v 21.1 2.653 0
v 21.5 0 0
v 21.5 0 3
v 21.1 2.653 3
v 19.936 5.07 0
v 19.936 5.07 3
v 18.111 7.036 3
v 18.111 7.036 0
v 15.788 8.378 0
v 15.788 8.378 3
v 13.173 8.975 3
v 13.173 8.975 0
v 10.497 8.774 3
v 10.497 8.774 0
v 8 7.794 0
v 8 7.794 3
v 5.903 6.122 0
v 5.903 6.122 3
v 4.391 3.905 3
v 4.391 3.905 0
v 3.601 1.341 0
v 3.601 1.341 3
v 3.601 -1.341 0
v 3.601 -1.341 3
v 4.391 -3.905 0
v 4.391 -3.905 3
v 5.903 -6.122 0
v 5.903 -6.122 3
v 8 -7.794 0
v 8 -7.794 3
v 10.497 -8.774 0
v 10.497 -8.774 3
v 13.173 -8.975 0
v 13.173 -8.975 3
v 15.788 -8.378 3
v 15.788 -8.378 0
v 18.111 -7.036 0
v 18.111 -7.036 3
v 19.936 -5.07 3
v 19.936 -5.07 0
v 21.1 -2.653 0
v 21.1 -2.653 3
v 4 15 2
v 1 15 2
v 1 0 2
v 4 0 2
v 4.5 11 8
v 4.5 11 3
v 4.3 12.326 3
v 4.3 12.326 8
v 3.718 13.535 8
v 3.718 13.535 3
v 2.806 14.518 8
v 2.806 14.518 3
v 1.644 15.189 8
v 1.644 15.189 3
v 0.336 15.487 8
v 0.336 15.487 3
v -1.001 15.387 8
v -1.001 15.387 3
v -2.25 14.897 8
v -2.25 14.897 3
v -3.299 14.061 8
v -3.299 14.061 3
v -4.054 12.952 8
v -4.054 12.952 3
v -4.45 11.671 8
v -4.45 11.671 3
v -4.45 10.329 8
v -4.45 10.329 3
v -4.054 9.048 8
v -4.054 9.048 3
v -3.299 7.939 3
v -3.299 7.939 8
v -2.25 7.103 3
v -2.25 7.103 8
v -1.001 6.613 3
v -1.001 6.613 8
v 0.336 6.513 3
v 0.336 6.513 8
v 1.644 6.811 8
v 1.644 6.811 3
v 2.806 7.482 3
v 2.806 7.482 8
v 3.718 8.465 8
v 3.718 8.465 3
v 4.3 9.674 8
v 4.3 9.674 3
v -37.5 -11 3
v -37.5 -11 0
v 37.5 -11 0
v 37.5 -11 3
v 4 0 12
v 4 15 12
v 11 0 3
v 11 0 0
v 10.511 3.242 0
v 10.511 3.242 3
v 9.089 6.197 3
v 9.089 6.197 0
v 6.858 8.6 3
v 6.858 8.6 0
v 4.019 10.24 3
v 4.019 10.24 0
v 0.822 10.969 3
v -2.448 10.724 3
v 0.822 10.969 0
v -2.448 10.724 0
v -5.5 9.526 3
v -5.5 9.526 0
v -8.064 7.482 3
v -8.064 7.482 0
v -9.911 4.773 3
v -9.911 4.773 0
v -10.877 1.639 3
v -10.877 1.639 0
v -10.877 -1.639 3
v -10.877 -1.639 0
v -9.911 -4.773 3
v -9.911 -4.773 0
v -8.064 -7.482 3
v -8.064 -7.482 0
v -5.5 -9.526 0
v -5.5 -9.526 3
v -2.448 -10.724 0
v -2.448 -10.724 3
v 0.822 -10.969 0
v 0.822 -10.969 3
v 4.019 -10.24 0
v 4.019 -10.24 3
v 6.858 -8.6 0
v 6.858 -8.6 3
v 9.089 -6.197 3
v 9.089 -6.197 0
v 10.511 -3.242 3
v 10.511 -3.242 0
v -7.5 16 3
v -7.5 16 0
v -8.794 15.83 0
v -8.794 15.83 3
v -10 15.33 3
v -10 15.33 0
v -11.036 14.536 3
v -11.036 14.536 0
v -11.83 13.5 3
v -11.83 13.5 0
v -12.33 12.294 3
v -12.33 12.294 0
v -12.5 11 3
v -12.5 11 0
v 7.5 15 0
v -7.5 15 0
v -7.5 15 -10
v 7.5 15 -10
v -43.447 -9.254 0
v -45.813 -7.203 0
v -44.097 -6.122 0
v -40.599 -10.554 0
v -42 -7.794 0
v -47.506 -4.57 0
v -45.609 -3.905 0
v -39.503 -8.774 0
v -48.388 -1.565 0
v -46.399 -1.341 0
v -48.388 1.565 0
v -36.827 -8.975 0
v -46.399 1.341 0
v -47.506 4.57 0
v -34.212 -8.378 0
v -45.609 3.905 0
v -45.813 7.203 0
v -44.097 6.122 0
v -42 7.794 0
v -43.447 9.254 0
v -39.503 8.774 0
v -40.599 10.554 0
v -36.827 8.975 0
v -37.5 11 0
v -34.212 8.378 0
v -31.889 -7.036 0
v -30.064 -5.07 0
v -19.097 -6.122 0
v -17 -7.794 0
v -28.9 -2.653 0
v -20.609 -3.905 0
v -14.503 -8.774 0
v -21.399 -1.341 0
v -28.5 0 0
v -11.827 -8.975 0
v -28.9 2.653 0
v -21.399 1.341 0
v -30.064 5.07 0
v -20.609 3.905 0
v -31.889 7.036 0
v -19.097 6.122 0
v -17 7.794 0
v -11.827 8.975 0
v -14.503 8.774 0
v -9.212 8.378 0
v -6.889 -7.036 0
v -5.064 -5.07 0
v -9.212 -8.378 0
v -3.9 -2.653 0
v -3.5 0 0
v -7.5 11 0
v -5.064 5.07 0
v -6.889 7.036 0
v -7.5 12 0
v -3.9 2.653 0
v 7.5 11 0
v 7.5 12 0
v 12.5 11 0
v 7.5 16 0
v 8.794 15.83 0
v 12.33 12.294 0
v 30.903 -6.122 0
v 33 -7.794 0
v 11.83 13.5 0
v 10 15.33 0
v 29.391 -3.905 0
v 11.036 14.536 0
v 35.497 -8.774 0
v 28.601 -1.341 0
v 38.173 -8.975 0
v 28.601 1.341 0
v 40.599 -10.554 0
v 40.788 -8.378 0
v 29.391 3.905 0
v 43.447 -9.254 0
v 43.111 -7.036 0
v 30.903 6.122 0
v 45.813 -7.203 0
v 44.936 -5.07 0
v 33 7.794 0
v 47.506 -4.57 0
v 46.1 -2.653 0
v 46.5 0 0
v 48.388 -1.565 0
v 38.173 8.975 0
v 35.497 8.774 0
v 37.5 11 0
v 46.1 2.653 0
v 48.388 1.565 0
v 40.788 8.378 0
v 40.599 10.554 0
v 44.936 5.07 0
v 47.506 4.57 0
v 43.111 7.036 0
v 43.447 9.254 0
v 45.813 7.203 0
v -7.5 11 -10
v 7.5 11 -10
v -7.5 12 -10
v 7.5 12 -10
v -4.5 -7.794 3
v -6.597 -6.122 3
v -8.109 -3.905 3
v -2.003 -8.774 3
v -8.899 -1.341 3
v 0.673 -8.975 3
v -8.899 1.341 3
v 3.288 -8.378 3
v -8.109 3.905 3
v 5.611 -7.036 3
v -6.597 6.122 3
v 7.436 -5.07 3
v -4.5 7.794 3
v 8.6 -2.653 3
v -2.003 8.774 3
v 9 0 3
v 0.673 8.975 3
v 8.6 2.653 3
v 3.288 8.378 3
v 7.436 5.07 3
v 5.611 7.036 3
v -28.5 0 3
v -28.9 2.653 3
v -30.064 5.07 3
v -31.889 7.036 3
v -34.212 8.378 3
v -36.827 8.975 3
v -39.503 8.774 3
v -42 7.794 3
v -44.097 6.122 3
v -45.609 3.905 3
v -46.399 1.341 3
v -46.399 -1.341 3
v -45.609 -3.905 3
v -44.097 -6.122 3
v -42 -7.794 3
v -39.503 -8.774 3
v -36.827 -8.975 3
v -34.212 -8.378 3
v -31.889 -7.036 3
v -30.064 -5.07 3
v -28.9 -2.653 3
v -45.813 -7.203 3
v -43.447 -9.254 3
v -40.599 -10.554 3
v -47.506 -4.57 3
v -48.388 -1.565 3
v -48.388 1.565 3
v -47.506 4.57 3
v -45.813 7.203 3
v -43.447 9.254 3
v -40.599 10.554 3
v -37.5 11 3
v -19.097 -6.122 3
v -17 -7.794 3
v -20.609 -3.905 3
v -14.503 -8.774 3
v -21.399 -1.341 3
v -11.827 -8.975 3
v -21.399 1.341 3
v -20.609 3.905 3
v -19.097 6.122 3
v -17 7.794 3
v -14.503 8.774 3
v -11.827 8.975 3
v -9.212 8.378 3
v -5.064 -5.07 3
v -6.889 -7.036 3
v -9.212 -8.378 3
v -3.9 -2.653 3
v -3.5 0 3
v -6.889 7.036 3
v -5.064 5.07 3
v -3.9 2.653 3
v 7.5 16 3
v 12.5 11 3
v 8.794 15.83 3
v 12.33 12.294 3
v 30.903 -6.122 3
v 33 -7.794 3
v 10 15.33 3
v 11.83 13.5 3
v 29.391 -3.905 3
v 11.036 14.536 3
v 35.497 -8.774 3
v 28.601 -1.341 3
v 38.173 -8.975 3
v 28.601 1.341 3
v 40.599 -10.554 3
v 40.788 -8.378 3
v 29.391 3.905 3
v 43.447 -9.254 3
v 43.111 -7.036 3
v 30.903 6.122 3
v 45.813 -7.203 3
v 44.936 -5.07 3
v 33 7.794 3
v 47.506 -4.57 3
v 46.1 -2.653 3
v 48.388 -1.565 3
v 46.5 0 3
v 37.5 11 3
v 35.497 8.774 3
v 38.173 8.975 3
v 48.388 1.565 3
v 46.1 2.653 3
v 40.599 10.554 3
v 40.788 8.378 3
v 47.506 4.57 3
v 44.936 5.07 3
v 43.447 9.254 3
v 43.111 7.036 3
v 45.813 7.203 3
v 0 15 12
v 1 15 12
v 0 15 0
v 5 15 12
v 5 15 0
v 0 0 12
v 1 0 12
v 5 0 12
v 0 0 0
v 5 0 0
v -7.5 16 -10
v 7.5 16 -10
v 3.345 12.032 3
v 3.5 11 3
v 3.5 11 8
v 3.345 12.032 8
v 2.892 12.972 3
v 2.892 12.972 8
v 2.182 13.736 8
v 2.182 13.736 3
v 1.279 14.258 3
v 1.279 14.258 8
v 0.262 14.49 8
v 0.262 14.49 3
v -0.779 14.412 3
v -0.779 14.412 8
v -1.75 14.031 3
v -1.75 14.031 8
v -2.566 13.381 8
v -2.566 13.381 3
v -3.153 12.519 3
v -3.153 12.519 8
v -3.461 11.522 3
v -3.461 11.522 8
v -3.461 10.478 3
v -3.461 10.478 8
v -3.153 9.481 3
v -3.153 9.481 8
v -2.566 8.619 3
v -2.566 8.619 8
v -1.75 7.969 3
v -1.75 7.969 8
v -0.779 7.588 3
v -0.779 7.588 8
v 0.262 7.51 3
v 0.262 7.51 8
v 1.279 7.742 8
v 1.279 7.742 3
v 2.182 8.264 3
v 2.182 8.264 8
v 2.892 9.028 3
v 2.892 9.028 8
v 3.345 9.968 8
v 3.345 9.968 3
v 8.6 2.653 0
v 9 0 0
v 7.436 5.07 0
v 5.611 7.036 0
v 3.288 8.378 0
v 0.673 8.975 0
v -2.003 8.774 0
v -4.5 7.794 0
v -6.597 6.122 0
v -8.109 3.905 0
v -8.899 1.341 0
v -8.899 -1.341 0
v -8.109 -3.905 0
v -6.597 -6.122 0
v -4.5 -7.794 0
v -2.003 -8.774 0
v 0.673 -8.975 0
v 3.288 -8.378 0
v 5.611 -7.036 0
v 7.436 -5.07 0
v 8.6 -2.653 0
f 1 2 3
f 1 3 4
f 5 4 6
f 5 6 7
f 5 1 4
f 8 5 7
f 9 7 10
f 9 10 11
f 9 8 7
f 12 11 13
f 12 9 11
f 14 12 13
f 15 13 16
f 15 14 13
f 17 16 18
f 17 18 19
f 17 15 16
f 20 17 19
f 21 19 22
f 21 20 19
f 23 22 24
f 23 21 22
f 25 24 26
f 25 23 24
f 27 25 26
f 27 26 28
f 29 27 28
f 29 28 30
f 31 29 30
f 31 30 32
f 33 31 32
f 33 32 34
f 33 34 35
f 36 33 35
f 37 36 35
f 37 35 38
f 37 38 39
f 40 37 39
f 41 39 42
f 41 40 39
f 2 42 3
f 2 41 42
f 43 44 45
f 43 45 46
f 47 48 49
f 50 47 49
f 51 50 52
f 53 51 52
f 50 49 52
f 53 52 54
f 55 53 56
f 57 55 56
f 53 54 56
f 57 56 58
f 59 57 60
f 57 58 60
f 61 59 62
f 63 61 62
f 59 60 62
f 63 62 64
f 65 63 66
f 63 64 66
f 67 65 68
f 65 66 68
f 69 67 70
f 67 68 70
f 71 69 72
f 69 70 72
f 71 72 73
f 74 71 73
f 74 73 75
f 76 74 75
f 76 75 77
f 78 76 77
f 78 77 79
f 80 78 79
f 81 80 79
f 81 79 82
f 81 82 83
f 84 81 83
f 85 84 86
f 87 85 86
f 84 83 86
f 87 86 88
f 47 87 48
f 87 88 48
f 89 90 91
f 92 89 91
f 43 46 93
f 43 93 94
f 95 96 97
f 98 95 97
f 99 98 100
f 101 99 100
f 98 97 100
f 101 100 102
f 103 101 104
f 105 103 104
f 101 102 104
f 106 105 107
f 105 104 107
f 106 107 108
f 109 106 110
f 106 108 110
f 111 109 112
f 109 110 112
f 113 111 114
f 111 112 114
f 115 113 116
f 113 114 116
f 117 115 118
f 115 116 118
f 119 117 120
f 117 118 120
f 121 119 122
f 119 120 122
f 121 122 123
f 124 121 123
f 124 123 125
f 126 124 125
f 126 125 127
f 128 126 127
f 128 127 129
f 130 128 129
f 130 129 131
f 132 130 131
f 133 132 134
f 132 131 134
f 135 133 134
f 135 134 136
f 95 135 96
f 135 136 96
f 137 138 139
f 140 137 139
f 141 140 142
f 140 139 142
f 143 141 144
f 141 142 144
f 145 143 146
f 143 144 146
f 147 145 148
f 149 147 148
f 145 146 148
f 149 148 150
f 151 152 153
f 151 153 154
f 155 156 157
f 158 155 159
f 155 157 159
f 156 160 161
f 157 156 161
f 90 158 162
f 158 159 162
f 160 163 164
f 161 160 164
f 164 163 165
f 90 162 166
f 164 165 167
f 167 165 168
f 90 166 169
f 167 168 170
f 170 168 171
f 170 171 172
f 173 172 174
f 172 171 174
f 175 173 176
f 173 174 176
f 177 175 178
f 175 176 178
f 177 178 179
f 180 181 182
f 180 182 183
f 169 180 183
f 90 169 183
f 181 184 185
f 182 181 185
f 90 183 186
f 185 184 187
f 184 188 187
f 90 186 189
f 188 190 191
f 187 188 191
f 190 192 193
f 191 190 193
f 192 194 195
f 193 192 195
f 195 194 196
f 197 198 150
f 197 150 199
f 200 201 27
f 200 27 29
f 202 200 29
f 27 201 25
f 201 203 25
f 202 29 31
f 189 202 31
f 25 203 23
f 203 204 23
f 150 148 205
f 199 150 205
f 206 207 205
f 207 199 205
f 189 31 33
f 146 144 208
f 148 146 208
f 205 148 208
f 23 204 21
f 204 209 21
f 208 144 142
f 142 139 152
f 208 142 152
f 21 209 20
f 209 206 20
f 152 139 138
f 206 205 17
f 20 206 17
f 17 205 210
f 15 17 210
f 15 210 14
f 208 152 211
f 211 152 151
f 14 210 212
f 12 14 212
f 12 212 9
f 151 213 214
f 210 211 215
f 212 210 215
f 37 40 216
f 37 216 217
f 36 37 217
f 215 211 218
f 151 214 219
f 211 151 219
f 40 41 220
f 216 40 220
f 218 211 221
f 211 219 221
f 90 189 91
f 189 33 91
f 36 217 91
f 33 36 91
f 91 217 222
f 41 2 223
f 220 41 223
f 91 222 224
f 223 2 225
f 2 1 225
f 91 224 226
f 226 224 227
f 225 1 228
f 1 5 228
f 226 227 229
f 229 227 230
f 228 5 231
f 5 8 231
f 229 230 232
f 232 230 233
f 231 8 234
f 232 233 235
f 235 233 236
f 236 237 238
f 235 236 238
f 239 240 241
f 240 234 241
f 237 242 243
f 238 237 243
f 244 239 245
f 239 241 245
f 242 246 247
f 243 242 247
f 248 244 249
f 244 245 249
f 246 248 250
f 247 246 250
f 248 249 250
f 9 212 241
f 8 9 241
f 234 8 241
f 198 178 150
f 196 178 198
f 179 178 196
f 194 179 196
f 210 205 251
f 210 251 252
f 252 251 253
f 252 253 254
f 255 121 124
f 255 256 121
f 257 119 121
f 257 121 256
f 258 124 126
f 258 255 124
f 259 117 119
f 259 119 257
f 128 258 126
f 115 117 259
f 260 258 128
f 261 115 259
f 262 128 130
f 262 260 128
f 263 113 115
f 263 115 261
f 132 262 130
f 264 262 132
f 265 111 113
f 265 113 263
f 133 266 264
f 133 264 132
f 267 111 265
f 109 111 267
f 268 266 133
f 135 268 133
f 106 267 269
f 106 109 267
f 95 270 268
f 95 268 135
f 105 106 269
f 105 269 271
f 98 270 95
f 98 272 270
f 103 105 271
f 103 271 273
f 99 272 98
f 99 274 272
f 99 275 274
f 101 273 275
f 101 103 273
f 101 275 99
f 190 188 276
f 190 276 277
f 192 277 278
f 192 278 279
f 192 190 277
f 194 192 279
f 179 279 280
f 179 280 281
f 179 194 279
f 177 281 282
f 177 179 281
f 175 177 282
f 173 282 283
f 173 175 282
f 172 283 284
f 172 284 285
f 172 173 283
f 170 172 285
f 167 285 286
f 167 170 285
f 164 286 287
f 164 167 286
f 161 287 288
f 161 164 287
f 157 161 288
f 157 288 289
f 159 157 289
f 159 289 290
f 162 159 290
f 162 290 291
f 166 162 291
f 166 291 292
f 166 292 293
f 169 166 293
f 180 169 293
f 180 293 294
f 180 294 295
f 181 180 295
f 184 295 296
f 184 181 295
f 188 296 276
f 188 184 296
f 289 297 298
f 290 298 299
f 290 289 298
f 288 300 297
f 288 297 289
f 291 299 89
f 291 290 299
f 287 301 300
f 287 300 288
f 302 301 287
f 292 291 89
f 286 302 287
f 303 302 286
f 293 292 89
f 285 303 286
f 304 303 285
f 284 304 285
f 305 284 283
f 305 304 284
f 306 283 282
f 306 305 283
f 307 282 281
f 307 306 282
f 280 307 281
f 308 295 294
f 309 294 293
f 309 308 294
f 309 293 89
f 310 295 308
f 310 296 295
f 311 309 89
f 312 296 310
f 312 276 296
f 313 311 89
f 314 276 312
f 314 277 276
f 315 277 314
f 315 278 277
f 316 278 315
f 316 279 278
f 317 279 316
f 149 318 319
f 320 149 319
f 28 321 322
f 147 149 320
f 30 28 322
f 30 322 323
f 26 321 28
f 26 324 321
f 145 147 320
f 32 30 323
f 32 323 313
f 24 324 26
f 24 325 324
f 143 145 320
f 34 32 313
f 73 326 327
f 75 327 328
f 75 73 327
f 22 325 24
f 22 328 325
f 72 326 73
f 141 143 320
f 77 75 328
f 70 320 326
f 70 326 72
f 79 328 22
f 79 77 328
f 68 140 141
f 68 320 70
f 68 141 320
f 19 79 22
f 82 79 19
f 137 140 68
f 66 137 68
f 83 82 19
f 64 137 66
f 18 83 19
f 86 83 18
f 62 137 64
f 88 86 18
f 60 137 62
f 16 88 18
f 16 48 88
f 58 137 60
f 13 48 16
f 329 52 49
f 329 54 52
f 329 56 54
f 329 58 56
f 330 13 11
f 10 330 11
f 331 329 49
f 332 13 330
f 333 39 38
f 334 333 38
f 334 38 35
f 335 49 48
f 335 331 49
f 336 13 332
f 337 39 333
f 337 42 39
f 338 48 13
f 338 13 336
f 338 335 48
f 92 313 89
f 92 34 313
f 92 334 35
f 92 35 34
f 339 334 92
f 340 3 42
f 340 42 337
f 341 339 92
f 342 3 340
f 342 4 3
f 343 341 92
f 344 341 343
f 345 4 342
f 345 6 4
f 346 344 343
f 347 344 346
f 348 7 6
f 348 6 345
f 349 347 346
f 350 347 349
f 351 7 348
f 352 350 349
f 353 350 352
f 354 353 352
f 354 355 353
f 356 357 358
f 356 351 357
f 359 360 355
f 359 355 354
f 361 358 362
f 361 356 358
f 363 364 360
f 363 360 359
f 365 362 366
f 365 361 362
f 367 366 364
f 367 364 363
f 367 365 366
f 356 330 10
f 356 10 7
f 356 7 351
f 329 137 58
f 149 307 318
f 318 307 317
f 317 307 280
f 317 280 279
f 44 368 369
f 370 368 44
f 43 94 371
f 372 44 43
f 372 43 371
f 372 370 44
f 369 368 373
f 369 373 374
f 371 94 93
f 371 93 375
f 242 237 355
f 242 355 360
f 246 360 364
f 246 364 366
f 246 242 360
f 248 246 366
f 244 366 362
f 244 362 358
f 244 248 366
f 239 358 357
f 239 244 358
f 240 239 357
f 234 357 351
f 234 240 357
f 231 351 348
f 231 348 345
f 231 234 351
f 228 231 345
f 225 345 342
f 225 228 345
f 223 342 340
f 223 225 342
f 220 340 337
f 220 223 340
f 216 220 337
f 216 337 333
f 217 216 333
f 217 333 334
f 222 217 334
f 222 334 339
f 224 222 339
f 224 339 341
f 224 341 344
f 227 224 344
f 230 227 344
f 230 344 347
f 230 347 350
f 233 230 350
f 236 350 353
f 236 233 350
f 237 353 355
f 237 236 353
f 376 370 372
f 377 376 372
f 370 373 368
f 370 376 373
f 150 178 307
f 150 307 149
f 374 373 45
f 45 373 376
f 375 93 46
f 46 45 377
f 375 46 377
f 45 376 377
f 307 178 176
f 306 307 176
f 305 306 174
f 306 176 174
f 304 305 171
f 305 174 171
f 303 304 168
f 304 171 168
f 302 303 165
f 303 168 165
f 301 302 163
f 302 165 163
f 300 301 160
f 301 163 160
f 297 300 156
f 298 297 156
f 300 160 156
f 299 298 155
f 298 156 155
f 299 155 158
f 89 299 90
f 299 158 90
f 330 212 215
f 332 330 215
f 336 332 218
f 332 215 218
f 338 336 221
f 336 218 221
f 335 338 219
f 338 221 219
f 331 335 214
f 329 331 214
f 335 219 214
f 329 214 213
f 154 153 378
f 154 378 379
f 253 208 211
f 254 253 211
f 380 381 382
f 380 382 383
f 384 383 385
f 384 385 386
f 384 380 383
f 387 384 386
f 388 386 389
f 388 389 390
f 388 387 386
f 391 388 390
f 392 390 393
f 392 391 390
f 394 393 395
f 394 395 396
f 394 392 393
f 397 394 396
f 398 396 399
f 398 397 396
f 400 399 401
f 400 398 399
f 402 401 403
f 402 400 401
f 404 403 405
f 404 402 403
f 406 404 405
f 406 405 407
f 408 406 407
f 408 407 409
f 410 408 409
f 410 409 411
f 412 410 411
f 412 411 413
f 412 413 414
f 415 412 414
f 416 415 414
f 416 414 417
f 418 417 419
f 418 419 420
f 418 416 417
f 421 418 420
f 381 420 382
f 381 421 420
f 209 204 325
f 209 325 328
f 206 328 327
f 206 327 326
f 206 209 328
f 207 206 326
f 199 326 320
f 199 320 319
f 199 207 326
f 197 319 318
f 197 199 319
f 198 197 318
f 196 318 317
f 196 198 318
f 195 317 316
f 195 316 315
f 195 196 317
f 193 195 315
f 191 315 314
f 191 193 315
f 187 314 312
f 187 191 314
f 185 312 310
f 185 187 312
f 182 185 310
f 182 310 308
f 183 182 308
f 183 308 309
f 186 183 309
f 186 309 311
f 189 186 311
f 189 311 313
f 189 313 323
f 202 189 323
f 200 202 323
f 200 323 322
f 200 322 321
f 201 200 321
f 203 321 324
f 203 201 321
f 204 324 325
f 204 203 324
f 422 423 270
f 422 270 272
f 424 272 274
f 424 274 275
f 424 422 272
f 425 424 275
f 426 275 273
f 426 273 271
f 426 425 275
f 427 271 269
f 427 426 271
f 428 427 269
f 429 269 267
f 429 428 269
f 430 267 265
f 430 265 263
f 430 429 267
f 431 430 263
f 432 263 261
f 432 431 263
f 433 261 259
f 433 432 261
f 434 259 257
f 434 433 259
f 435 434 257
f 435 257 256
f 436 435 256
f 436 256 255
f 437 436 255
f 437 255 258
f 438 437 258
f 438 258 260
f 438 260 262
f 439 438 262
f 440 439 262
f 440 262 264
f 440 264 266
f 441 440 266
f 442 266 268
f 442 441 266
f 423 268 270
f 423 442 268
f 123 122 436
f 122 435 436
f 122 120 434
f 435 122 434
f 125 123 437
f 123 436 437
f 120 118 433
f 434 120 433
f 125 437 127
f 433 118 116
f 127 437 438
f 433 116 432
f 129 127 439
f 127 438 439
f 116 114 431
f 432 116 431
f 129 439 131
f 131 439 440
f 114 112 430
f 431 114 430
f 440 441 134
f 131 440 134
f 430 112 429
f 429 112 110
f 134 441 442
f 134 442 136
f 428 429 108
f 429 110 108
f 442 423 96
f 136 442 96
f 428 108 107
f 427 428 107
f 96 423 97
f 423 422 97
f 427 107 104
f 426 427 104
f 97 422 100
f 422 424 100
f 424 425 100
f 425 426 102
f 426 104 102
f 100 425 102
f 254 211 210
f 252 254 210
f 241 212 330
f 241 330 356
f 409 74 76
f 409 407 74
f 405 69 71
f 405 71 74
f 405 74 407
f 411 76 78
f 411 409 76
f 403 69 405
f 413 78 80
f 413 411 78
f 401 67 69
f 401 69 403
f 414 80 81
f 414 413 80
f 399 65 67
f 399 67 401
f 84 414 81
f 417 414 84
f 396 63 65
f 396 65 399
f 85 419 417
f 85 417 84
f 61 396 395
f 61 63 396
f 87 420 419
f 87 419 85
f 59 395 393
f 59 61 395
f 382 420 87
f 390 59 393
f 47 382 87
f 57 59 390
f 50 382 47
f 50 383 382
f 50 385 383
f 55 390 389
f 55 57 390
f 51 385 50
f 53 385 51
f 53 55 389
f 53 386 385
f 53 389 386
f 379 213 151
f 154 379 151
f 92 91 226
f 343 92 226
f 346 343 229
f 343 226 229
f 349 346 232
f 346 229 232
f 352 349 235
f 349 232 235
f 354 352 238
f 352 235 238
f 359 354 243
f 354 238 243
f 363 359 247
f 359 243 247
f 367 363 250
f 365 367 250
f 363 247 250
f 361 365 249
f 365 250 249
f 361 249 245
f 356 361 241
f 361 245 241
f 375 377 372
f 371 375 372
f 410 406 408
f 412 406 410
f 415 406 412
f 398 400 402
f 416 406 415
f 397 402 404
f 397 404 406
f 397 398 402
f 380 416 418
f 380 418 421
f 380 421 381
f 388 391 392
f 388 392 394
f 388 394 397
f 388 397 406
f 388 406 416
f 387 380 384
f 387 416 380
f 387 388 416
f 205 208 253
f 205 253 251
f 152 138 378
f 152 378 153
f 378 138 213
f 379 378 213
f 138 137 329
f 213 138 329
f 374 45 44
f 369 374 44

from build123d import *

# Parameters (mm, degrees)
SKETCH_W      = 5
SKETCH_H      = 15
PAD_DEPTH     = 2
SKETCH001_W   = 1
SKETCH001_H   = 15
PAD001_DEPTH  = 10
SKETCH002_R   = 11
SKETCH002_R_2 = 9
PAD002_DEPTH  = 3
SKETCH003_R   = 9
PAD003_DEPTH  = 3
SKETCH004_R   = 4.5
SKETCH004_R_2 = 3.5
PAD004_DEPTH  = 5
SKETCH005_W   = 15
SKETCH005_H   = 1
PAD005_DEPTH  = 10


with BuildPart() as clip:
    # Sketch → Pad (new body)
    with BuildSketch(Plane.XY):
        with Locations((2.5, 7.5)):
            Rectangle(SKETCH_W, SKETCH_H)
    extrude(amount=PAD_DEPTH)

    # Sketch001 (on Face6 of Pad) → Pad001 (join)
    with BuildSketch(Plane.XY.offset(2)):
        with Locations((0.5, 7.5)):
            Rectangle(SKETCH001_W, SKETCH001_H)
        with Locations((4.5, 7.5)):
            Rectangle(SKETCH001_W, SKETCH001_H)
    extrude(amount=PAD001_DEPTH)


with BuildPart() as pillsslot:
    # Sketch002 → Pad002 (new body)
    with BuildSketch(Plane.XY):
        Circle(SKETCH002_R)
        Circle(SKETCH002_R_2, mode=Mode.SUBTRACT)
    extrude(amount=PAD002_DEPTH)


with BuildPart() as main:
    # Sketch003 → Pad003 (new body)
    with BuildSketch(Plane.XY):
        with BuildLine():
            ThreePointArc((37.5, -11), (48.5, 0), (37.5, 11))
            Line((12.5, 11), (37.5, 11))
            ThreePointArc((12.5, 11), (11.035534, 14.535534), (7.5, 16))
            Line((-7.5, 16), (7.5, 16))
            ThreePointArc((-7.5, 16), (-11.035534, 14.535534), (-12.5, 11))
            Line((-37.5, 11), (-12.5, 11))
            ThreePointArc((-37.5, 11), (-48.5, 0), (-37.5, -11))
            Line((-37.5, -11), (37.5, -11))
        make_face()
        with Locations((37.5, 0)):
            Circle(SKETCH003_R, mode=Mode.SUBTRACT)
        with Locations((-37.5, 0)):
            Circle(SKETCH003_R, mode=Mode.SUBTRACT)
        with Locations((-12.5, 0)):
            Circle(SKETCH003_R, mode=Mode.SUBTRACT)
        with Locations((12.5, 0)):
            Circle(SKETCH003_R, mode=Mode.SUBTRACT)
    extrude(amount=PAD003_DEPTH)

    # Sketch004 (on Face14 of Pad003) → Pad004 (join)
    with BuildSketch(Plane.XY.offset(3)):
        with Locations((0, 11)):
            Circle(SKETCH004_R)
        with Locations((0, 11)):
            Circle(SKETCH004_R_2, mode=Mode.SUBTRACT)
    extrude(amount=PAD004_DEPTH)

    # Sketch005 (on Face4 of Pad004) → Pad005 (join)
    with BuildSketch(Plane(origin=(0, 0, 0), x_dir=(1, 0, 0), z_dir=(0, 0, -1))):
        with Locations((0, -15.5)):
            Rectangle(SKETCH005_W, SKETCH005_H)
        with Locations((0, -11.5)):
            Rectangle(SKETCH005_W, SKETCH005_H)
    extrude(amount=PAD005_DEPTH)


solid = Compound([clip.part, pillsslot.part, main.part])
